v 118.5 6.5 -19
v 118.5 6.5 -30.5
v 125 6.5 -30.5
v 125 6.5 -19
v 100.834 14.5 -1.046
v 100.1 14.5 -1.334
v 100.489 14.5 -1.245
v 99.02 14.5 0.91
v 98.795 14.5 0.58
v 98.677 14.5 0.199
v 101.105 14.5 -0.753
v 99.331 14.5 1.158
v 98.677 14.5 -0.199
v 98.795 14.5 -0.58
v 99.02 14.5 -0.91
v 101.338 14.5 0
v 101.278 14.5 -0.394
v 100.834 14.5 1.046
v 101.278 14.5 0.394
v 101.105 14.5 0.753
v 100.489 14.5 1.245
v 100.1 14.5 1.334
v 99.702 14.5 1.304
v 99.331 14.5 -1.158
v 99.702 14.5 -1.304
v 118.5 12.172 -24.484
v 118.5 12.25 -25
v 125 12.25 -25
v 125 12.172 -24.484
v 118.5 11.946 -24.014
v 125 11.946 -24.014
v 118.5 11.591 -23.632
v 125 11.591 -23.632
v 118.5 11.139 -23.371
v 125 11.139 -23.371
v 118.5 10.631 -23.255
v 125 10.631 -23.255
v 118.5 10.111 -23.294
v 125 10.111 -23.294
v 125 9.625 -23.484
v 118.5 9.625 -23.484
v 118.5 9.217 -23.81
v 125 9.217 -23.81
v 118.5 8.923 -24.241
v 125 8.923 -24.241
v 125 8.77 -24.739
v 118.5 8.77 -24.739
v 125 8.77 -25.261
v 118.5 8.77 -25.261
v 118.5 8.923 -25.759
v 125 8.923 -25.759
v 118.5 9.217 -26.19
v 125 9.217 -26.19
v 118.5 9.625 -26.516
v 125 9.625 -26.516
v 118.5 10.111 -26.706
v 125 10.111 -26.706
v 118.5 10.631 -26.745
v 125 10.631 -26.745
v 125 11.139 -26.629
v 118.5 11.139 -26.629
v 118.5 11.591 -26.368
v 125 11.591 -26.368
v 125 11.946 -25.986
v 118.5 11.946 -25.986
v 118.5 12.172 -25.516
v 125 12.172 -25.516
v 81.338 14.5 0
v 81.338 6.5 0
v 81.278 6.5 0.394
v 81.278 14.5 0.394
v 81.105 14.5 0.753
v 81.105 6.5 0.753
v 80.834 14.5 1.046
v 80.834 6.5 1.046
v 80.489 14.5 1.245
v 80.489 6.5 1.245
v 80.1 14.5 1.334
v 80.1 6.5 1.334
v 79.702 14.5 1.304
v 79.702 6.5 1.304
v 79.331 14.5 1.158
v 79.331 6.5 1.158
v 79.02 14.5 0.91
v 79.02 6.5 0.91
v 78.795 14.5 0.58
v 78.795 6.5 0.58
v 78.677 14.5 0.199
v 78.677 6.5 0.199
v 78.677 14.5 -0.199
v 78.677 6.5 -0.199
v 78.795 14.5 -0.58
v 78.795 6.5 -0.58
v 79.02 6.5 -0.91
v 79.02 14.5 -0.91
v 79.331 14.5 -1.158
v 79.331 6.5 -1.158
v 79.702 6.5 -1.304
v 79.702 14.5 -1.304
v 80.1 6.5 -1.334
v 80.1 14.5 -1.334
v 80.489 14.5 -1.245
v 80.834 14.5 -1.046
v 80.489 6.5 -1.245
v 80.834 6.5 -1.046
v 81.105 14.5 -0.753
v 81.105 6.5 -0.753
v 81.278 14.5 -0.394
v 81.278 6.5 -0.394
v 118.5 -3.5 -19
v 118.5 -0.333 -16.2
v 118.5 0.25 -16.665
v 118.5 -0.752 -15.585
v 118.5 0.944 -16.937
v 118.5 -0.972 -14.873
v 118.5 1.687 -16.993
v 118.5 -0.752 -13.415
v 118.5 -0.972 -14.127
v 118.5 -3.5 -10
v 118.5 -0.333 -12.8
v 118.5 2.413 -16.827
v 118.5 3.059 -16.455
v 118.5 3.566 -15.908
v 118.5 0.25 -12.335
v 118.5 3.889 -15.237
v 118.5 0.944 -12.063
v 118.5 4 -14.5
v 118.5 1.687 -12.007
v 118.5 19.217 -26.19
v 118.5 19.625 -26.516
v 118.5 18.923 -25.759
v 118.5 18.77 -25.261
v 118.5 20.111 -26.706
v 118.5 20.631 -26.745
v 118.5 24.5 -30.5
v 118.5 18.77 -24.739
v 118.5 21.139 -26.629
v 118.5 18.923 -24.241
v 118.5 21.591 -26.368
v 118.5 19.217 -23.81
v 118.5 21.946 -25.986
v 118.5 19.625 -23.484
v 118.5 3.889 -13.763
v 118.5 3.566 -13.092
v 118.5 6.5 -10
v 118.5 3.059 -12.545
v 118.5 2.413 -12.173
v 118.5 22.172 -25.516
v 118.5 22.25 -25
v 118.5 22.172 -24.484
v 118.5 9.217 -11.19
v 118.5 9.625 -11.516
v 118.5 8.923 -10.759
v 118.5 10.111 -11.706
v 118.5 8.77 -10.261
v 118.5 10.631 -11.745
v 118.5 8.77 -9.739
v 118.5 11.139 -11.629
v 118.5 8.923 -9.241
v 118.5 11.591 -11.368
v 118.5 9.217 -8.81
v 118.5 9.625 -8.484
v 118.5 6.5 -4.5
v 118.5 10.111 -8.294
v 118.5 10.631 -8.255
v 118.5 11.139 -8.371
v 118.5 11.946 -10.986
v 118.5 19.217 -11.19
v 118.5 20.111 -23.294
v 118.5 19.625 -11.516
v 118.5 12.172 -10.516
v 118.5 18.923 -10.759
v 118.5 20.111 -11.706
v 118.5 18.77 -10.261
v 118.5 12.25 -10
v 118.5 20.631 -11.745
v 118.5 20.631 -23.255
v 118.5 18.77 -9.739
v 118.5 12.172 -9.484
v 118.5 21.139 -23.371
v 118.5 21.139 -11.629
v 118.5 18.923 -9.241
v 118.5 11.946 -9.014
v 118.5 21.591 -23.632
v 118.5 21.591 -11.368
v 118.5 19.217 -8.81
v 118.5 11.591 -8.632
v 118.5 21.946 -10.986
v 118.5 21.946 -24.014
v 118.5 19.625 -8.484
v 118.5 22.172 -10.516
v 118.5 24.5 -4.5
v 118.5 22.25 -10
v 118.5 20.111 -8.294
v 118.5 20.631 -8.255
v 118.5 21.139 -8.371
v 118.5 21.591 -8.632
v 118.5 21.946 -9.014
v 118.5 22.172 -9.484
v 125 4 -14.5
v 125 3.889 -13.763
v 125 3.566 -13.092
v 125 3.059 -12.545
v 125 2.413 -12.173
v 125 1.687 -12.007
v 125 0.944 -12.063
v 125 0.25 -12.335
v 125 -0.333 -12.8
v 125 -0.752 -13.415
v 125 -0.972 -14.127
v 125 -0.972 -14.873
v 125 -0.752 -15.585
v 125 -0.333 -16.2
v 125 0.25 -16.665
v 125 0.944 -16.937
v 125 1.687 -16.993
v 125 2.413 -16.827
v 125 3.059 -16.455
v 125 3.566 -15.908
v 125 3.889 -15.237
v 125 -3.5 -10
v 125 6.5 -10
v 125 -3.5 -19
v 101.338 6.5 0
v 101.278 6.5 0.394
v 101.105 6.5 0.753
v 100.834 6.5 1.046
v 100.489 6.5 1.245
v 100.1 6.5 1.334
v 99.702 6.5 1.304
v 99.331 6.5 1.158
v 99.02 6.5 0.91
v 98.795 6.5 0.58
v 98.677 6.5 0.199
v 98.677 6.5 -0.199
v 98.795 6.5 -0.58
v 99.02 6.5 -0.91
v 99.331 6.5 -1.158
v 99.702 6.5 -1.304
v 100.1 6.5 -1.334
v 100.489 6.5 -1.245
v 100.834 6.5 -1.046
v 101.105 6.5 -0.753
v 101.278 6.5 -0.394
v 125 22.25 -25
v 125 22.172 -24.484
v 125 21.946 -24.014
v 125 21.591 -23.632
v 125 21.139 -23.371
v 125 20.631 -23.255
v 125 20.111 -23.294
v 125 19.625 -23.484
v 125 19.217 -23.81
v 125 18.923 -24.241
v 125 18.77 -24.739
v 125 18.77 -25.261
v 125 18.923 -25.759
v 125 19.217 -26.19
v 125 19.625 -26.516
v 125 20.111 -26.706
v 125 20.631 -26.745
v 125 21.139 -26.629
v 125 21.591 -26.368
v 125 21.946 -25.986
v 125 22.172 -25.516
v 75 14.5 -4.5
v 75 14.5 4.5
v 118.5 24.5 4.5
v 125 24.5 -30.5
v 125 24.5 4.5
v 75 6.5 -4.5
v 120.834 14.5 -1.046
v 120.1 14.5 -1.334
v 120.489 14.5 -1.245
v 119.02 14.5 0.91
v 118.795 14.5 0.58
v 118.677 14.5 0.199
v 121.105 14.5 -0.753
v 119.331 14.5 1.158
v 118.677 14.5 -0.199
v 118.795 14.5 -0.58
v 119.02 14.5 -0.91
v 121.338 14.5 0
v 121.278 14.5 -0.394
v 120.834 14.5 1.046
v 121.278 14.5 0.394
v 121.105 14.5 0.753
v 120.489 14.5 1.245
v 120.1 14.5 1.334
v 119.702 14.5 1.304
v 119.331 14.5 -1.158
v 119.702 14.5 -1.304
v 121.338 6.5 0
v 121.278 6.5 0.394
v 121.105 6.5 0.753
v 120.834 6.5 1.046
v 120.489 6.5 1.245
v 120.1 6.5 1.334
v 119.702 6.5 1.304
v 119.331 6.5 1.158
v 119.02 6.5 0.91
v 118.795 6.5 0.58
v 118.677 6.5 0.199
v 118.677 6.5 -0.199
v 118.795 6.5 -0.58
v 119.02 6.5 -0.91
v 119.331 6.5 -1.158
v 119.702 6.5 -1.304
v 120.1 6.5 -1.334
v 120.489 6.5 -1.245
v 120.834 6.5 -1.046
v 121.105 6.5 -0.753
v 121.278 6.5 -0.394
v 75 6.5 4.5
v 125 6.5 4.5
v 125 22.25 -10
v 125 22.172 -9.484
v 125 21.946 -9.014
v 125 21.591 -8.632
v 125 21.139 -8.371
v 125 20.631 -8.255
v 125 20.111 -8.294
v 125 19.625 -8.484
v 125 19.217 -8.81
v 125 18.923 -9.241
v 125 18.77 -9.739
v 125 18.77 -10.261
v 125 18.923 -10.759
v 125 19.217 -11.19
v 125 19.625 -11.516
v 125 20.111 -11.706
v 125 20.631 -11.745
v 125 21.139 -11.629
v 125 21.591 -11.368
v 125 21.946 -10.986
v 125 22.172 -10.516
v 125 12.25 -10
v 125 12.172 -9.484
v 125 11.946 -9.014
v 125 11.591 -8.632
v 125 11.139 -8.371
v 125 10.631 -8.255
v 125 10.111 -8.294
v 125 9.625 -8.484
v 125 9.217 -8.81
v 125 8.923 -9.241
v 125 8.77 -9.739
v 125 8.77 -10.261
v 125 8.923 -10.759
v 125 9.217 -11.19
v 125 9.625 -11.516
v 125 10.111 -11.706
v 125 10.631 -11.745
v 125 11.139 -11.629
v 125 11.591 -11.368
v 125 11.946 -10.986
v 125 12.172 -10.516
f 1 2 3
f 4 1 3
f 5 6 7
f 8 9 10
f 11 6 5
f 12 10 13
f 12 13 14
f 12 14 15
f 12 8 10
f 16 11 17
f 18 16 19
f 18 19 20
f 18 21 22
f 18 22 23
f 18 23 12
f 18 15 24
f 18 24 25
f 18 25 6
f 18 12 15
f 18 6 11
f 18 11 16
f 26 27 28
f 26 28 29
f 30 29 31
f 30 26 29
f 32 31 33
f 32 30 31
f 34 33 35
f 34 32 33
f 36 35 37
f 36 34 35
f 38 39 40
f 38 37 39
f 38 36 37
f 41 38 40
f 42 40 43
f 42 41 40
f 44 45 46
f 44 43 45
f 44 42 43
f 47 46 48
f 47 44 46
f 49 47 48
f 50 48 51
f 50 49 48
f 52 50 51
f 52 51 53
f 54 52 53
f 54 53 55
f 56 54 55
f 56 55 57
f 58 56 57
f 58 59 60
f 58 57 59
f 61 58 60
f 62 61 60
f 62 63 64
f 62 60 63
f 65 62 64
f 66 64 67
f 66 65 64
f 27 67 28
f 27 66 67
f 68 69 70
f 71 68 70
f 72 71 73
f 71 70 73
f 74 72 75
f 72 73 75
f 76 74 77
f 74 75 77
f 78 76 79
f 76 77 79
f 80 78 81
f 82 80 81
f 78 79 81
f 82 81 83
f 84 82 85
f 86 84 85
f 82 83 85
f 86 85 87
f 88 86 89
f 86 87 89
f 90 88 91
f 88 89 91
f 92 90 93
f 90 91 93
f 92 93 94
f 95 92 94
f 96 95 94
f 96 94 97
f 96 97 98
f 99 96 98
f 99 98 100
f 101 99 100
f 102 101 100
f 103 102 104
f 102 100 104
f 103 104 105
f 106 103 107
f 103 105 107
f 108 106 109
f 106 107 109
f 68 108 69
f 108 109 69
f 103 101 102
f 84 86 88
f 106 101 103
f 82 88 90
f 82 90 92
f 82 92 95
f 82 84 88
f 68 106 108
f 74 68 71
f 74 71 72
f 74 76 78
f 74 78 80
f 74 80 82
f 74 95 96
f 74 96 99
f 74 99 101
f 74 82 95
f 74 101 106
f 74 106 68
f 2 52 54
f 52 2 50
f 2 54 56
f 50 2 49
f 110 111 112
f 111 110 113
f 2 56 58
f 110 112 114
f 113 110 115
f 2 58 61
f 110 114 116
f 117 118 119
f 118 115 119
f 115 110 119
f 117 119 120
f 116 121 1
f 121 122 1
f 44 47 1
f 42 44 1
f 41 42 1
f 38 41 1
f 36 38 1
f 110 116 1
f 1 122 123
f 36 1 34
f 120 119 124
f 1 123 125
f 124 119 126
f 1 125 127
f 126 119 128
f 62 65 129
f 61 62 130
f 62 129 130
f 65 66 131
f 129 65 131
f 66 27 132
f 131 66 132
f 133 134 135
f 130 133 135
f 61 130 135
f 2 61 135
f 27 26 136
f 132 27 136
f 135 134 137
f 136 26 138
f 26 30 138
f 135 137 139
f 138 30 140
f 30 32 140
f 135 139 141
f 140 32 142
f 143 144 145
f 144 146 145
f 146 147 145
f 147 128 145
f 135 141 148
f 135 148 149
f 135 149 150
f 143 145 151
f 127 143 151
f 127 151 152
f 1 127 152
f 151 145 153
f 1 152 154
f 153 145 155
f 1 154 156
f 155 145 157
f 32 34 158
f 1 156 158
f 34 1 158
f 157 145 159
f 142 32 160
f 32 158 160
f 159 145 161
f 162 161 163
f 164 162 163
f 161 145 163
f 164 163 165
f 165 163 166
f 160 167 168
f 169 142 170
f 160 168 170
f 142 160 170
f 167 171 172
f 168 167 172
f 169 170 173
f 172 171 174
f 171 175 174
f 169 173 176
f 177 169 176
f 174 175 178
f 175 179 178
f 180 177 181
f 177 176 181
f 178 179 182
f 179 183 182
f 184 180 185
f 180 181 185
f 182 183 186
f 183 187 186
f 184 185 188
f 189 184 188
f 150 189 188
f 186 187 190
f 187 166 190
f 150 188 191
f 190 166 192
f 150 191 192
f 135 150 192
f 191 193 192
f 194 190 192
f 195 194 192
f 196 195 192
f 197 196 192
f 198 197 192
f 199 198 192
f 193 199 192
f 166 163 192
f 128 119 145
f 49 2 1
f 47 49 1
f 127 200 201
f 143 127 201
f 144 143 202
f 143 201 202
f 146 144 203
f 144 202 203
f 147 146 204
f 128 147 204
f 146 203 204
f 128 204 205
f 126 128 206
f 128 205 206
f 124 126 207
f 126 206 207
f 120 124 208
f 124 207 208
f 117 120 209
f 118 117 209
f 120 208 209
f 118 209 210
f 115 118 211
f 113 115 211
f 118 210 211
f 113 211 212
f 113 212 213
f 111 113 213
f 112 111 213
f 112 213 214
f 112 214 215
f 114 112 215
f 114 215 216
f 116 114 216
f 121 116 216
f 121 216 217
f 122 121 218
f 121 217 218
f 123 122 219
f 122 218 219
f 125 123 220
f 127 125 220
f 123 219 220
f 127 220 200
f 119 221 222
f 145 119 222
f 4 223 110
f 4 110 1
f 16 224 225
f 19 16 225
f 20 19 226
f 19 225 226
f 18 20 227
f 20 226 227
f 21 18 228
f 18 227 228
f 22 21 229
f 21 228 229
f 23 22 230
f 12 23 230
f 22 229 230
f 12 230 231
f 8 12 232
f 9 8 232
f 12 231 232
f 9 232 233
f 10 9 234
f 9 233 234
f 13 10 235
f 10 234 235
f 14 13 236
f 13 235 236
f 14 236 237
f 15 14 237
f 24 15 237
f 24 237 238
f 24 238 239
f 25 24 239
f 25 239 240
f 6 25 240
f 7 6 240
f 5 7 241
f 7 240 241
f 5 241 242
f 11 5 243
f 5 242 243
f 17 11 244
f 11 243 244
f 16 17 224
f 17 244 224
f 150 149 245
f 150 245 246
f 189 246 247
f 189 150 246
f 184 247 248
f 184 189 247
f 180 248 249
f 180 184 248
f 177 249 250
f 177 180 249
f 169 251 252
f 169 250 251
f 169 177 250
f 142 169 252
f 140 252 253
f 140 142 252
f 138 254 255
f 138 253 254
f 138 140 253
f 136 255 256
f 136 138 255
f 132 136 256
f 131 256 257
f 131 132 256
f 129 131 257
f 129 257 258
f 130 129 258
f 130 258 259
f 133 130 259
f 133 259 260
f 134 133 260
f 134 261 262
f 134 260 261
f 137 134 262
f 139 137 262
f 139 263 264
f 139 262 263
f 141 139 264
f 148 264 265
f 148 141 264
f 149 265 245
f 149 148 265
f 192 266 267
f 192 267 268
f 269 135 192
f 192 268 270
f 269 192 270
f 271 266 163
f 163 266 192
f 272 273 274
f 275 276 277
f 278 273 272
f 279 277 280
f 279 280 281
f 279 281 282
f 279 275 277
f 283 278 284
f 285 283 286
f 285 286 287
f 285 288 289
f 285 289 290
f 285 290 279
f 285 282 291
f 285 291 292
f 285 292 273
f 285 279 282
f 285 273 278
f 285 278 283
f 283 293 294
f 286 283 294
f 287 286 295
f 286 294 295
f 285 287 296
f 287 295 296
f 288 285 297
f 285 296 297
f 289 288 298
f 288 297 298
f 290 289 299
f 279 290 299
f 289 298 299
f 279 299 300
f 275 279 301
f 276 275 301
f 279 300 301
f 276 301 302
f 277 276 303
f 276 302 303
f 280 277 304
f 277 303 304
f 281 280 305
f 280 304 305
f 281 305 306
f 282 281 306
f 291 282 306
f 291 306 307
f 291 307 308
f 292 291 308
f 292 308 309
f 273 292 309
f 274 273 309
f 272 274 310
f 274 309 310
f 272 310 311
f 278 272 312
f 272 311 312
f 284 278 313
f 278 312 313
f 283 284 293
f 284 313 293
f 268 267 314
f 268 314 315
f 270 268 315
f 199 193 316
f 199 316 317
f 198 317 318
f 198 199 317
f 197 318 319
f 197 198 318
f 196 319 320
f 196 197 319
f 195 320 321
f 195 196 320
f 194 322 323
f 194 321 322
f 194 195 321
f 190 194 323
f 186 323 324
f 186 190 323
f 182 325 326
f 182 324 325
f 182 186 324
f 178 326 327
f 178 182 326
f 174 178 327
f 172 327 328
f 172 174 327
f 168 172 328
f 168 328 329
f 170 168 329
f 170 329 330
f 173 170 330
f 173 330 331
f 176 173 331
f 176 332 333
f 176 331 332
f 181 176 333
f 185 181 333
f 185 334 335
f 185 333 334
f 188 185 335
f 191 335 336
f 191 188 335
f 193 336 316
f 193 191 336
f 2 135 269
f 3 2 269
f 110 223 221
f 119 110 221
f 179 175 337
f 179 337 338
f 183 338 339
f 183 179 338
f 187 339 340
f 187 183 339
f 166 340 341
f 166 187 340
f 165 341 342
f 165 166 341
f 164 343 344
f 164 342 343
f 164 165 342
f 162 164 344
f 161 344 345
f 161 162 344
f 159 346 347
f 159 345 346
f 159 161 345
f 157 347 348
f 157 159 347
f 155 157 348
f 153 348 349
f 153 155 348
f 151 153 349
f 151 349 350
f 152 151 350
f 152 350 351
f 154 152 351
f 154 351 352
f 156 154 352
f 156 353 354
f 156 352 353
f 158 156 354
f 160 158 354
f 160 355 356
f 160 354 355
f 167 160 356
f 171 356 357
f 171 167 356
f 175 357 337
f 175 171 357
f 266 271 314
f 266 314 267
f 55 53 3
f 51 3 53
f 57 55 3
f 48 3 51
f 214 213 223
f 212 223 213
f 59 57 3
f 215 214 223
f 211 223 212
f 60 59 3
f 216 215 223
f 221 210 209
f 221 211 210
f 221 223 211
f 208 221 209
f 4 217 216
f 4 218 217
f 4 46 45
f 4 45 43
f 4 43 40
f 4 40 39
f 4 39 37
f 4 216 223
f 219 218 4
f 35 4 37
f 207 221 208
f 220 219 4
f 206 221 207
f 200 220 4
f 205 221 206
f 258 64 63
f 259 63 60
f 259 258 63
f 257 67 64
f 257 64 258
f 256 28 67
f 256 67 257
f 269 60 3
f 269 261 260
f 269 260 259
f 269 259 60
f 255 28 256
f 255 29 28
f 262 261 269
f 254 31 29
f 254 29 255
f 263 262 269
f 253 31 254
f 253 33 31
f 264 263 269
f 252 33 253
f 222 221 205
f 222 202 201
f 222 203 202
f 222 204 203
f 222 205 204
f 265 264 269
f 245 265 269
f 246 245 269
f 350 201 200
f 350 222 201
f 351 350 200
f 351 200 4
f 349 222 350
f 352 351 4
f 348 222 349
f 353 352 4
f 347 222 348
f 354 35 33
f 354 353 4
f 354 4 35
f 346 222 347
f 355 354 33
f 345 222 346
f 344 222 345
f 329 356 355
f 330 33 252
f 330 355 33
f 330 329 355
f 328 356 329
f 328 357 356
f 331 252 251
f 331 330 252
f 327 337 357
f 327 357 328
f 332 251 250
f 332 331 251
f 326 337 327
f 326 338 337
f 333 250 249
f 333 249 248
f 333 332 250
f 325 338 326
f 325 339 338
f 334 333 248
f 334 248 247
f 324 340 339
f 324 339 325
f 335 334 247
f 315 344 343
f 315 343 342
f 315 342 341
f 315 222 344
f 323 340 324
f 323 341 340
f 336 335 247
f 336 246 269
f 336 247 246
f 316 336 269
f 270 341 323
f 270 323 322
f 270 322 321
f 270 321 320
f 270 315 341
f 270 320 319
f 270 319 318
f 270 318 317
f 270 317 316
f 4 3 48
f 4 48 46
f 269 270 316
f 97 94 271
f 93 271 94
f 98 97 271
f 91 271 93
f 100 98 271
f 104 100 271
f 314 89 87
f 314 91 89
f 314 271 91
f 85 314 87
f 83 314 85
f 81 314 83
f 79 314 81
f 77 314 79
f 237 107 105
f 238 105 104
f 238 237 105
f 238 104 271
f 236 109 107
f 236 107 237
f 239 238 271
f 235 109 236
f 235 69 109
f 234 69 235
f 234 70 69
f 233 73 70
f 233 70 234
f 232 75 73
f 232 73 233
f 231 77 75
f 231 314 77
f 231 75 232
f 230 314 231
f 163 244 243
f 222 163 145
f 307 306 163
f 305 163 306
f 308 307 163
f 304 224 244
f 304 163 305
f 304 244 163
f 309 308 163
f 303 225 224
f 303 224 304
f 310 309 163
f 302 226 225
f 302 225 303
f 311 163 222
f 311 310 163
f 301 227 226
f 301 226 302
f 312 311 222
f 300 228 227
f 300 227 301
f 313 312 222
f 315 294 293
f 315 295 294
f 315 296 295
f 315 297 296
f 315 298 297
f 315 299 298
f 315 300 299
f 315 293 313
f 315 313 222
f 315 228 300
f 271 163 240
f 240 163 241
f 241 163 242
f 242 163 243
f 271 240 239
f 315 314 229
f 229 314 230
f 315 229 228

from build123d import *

# Parameters (mm, degrees)
SKETCH018_W          = 50
SKETCH018_H          = 18
PAD011_DEPTH         = 4.5
SKETCH019_R          = 1.3375
POCKET006_DEPTH      = 8
POCKET007_DEPTH      = 9.001
SKETCH021_W          = 6.5
SKETCH021_H          = 18
PAD012_DEPTH         = 26
SKETCH022_R          = 1.75
POCKET008_DEPTH      = 0.001
POCKET008_DEPTH_BACK = 50.001
SKETCH023_R          = 3
POCKET009_DEPTH      = 5
SKETCH024_W          = 10
SKETCH024_H          = 9
SKETCH024_R          = 2.5
PAD013_DEPTH         = 6.5


with BuildPart() as part:
    # Sketch018 → Pad011 (new body, symmetric)
    with BuildSketch(Plane.XY):
        with Locations((25, 9)):
            Rectangle(SKETCH018_W, SKETCH018_H)
    extrude(amount=PAD011_DEPTH, both=True)

    # Sketch019 → Pocket006 (cut)
    with BuildSketch(Plane.XZ):
        with Locations((5, 0)):
            Circle(SKETCH019_R)
        with Locations((25, 0)):
            Circle(SKETCH019_R)
        with Locations((45, 0)):
            Circle(SKETCH019_R)
    extrude(amount=-POCKET006_DEPTH, mode=Mode.SUBTRACT)

    # Sketch020 (on Face4 of Pocket006) → Pocket007 (cut, through all)
    with BuildSketch(Plane(origin=(0, 0, -4.5), x_dir=(1, 0, 0), z_dir=(0, 0, -1))):
        Polygon((0, -8), (43.5, -18), (0, -18), align=None)
    extrude(amount=-POCKET007_DEPTH, mode=Mode.SUBTRACT)

    # Sketch021 (on Face4 of Pocket007) → Pad012 (join)
    with BuildSketch(Plane.XY.offset(-4.5)):
        with Locations((46.75, 9)):
            Rectangle(SKETCH021_W, SKETCH021_H)
    extrude(amount=-PAD012_DEPTH)

    # Sketch022 → Pocket008 (cut, two sides)
    with BuildSketch(Plane.YZ) as pocket008_sk:
        with Locations((4, -25)):
            Circle(SKETCH022_R)
        with Locations((4, -10)):
            Circle(SKETCH022_R)
        with Locations((14, -10)):
            Circle(SKETCH022_R)
        with Locations((14, -25)):
            Circle(SKETCH022_R)
    extrude(amount=-POCKET008_DEPTH, mode=Mode.SUBTRACT)
    extrude(pocket008_sk.sketch, amount=POCKET008_DEPTH_BACK, mode=Mode.SUBTRACT)

    # Sketch023 → Pocket009 (cut, symmetric)
    with BuildSketch(Plane.YZ.offset(32)):
        with Locations((4, -10)):
            Circle(SKETCH023_R)
        with Locations((14, -10)):
            Circle(SKETCH023_R)
        with Locations((14, -25)):
            Circle(SKETCH023_R)
        with Locations((4, -25)):
            Circle(SKETCH023_R)
    extrude(amount=POCKET009_DEPTH, both=True, mode=Mode.SUBTRACT)

    # Sketch024 (on Face7 of Pocket009) → Pad013 (join)
    with BuildSketch(Plane.YZ.offset(50)):
        with Locations((-5, -14.5)):
            Rectangle(SKETCH024_W, SKETCH024_H)
        with Locations((-5, -14.5)):
            Circle(SKETCH024_R, mode=Mode.SUBTRACT)
    extrude(amount=-PAD013_DEPTH)


with BuildPart() as part_1:
    # Body005 placement: moved
    add(part.part.moved(Location((75, 6.5, 0))))


solid = part_1.part
